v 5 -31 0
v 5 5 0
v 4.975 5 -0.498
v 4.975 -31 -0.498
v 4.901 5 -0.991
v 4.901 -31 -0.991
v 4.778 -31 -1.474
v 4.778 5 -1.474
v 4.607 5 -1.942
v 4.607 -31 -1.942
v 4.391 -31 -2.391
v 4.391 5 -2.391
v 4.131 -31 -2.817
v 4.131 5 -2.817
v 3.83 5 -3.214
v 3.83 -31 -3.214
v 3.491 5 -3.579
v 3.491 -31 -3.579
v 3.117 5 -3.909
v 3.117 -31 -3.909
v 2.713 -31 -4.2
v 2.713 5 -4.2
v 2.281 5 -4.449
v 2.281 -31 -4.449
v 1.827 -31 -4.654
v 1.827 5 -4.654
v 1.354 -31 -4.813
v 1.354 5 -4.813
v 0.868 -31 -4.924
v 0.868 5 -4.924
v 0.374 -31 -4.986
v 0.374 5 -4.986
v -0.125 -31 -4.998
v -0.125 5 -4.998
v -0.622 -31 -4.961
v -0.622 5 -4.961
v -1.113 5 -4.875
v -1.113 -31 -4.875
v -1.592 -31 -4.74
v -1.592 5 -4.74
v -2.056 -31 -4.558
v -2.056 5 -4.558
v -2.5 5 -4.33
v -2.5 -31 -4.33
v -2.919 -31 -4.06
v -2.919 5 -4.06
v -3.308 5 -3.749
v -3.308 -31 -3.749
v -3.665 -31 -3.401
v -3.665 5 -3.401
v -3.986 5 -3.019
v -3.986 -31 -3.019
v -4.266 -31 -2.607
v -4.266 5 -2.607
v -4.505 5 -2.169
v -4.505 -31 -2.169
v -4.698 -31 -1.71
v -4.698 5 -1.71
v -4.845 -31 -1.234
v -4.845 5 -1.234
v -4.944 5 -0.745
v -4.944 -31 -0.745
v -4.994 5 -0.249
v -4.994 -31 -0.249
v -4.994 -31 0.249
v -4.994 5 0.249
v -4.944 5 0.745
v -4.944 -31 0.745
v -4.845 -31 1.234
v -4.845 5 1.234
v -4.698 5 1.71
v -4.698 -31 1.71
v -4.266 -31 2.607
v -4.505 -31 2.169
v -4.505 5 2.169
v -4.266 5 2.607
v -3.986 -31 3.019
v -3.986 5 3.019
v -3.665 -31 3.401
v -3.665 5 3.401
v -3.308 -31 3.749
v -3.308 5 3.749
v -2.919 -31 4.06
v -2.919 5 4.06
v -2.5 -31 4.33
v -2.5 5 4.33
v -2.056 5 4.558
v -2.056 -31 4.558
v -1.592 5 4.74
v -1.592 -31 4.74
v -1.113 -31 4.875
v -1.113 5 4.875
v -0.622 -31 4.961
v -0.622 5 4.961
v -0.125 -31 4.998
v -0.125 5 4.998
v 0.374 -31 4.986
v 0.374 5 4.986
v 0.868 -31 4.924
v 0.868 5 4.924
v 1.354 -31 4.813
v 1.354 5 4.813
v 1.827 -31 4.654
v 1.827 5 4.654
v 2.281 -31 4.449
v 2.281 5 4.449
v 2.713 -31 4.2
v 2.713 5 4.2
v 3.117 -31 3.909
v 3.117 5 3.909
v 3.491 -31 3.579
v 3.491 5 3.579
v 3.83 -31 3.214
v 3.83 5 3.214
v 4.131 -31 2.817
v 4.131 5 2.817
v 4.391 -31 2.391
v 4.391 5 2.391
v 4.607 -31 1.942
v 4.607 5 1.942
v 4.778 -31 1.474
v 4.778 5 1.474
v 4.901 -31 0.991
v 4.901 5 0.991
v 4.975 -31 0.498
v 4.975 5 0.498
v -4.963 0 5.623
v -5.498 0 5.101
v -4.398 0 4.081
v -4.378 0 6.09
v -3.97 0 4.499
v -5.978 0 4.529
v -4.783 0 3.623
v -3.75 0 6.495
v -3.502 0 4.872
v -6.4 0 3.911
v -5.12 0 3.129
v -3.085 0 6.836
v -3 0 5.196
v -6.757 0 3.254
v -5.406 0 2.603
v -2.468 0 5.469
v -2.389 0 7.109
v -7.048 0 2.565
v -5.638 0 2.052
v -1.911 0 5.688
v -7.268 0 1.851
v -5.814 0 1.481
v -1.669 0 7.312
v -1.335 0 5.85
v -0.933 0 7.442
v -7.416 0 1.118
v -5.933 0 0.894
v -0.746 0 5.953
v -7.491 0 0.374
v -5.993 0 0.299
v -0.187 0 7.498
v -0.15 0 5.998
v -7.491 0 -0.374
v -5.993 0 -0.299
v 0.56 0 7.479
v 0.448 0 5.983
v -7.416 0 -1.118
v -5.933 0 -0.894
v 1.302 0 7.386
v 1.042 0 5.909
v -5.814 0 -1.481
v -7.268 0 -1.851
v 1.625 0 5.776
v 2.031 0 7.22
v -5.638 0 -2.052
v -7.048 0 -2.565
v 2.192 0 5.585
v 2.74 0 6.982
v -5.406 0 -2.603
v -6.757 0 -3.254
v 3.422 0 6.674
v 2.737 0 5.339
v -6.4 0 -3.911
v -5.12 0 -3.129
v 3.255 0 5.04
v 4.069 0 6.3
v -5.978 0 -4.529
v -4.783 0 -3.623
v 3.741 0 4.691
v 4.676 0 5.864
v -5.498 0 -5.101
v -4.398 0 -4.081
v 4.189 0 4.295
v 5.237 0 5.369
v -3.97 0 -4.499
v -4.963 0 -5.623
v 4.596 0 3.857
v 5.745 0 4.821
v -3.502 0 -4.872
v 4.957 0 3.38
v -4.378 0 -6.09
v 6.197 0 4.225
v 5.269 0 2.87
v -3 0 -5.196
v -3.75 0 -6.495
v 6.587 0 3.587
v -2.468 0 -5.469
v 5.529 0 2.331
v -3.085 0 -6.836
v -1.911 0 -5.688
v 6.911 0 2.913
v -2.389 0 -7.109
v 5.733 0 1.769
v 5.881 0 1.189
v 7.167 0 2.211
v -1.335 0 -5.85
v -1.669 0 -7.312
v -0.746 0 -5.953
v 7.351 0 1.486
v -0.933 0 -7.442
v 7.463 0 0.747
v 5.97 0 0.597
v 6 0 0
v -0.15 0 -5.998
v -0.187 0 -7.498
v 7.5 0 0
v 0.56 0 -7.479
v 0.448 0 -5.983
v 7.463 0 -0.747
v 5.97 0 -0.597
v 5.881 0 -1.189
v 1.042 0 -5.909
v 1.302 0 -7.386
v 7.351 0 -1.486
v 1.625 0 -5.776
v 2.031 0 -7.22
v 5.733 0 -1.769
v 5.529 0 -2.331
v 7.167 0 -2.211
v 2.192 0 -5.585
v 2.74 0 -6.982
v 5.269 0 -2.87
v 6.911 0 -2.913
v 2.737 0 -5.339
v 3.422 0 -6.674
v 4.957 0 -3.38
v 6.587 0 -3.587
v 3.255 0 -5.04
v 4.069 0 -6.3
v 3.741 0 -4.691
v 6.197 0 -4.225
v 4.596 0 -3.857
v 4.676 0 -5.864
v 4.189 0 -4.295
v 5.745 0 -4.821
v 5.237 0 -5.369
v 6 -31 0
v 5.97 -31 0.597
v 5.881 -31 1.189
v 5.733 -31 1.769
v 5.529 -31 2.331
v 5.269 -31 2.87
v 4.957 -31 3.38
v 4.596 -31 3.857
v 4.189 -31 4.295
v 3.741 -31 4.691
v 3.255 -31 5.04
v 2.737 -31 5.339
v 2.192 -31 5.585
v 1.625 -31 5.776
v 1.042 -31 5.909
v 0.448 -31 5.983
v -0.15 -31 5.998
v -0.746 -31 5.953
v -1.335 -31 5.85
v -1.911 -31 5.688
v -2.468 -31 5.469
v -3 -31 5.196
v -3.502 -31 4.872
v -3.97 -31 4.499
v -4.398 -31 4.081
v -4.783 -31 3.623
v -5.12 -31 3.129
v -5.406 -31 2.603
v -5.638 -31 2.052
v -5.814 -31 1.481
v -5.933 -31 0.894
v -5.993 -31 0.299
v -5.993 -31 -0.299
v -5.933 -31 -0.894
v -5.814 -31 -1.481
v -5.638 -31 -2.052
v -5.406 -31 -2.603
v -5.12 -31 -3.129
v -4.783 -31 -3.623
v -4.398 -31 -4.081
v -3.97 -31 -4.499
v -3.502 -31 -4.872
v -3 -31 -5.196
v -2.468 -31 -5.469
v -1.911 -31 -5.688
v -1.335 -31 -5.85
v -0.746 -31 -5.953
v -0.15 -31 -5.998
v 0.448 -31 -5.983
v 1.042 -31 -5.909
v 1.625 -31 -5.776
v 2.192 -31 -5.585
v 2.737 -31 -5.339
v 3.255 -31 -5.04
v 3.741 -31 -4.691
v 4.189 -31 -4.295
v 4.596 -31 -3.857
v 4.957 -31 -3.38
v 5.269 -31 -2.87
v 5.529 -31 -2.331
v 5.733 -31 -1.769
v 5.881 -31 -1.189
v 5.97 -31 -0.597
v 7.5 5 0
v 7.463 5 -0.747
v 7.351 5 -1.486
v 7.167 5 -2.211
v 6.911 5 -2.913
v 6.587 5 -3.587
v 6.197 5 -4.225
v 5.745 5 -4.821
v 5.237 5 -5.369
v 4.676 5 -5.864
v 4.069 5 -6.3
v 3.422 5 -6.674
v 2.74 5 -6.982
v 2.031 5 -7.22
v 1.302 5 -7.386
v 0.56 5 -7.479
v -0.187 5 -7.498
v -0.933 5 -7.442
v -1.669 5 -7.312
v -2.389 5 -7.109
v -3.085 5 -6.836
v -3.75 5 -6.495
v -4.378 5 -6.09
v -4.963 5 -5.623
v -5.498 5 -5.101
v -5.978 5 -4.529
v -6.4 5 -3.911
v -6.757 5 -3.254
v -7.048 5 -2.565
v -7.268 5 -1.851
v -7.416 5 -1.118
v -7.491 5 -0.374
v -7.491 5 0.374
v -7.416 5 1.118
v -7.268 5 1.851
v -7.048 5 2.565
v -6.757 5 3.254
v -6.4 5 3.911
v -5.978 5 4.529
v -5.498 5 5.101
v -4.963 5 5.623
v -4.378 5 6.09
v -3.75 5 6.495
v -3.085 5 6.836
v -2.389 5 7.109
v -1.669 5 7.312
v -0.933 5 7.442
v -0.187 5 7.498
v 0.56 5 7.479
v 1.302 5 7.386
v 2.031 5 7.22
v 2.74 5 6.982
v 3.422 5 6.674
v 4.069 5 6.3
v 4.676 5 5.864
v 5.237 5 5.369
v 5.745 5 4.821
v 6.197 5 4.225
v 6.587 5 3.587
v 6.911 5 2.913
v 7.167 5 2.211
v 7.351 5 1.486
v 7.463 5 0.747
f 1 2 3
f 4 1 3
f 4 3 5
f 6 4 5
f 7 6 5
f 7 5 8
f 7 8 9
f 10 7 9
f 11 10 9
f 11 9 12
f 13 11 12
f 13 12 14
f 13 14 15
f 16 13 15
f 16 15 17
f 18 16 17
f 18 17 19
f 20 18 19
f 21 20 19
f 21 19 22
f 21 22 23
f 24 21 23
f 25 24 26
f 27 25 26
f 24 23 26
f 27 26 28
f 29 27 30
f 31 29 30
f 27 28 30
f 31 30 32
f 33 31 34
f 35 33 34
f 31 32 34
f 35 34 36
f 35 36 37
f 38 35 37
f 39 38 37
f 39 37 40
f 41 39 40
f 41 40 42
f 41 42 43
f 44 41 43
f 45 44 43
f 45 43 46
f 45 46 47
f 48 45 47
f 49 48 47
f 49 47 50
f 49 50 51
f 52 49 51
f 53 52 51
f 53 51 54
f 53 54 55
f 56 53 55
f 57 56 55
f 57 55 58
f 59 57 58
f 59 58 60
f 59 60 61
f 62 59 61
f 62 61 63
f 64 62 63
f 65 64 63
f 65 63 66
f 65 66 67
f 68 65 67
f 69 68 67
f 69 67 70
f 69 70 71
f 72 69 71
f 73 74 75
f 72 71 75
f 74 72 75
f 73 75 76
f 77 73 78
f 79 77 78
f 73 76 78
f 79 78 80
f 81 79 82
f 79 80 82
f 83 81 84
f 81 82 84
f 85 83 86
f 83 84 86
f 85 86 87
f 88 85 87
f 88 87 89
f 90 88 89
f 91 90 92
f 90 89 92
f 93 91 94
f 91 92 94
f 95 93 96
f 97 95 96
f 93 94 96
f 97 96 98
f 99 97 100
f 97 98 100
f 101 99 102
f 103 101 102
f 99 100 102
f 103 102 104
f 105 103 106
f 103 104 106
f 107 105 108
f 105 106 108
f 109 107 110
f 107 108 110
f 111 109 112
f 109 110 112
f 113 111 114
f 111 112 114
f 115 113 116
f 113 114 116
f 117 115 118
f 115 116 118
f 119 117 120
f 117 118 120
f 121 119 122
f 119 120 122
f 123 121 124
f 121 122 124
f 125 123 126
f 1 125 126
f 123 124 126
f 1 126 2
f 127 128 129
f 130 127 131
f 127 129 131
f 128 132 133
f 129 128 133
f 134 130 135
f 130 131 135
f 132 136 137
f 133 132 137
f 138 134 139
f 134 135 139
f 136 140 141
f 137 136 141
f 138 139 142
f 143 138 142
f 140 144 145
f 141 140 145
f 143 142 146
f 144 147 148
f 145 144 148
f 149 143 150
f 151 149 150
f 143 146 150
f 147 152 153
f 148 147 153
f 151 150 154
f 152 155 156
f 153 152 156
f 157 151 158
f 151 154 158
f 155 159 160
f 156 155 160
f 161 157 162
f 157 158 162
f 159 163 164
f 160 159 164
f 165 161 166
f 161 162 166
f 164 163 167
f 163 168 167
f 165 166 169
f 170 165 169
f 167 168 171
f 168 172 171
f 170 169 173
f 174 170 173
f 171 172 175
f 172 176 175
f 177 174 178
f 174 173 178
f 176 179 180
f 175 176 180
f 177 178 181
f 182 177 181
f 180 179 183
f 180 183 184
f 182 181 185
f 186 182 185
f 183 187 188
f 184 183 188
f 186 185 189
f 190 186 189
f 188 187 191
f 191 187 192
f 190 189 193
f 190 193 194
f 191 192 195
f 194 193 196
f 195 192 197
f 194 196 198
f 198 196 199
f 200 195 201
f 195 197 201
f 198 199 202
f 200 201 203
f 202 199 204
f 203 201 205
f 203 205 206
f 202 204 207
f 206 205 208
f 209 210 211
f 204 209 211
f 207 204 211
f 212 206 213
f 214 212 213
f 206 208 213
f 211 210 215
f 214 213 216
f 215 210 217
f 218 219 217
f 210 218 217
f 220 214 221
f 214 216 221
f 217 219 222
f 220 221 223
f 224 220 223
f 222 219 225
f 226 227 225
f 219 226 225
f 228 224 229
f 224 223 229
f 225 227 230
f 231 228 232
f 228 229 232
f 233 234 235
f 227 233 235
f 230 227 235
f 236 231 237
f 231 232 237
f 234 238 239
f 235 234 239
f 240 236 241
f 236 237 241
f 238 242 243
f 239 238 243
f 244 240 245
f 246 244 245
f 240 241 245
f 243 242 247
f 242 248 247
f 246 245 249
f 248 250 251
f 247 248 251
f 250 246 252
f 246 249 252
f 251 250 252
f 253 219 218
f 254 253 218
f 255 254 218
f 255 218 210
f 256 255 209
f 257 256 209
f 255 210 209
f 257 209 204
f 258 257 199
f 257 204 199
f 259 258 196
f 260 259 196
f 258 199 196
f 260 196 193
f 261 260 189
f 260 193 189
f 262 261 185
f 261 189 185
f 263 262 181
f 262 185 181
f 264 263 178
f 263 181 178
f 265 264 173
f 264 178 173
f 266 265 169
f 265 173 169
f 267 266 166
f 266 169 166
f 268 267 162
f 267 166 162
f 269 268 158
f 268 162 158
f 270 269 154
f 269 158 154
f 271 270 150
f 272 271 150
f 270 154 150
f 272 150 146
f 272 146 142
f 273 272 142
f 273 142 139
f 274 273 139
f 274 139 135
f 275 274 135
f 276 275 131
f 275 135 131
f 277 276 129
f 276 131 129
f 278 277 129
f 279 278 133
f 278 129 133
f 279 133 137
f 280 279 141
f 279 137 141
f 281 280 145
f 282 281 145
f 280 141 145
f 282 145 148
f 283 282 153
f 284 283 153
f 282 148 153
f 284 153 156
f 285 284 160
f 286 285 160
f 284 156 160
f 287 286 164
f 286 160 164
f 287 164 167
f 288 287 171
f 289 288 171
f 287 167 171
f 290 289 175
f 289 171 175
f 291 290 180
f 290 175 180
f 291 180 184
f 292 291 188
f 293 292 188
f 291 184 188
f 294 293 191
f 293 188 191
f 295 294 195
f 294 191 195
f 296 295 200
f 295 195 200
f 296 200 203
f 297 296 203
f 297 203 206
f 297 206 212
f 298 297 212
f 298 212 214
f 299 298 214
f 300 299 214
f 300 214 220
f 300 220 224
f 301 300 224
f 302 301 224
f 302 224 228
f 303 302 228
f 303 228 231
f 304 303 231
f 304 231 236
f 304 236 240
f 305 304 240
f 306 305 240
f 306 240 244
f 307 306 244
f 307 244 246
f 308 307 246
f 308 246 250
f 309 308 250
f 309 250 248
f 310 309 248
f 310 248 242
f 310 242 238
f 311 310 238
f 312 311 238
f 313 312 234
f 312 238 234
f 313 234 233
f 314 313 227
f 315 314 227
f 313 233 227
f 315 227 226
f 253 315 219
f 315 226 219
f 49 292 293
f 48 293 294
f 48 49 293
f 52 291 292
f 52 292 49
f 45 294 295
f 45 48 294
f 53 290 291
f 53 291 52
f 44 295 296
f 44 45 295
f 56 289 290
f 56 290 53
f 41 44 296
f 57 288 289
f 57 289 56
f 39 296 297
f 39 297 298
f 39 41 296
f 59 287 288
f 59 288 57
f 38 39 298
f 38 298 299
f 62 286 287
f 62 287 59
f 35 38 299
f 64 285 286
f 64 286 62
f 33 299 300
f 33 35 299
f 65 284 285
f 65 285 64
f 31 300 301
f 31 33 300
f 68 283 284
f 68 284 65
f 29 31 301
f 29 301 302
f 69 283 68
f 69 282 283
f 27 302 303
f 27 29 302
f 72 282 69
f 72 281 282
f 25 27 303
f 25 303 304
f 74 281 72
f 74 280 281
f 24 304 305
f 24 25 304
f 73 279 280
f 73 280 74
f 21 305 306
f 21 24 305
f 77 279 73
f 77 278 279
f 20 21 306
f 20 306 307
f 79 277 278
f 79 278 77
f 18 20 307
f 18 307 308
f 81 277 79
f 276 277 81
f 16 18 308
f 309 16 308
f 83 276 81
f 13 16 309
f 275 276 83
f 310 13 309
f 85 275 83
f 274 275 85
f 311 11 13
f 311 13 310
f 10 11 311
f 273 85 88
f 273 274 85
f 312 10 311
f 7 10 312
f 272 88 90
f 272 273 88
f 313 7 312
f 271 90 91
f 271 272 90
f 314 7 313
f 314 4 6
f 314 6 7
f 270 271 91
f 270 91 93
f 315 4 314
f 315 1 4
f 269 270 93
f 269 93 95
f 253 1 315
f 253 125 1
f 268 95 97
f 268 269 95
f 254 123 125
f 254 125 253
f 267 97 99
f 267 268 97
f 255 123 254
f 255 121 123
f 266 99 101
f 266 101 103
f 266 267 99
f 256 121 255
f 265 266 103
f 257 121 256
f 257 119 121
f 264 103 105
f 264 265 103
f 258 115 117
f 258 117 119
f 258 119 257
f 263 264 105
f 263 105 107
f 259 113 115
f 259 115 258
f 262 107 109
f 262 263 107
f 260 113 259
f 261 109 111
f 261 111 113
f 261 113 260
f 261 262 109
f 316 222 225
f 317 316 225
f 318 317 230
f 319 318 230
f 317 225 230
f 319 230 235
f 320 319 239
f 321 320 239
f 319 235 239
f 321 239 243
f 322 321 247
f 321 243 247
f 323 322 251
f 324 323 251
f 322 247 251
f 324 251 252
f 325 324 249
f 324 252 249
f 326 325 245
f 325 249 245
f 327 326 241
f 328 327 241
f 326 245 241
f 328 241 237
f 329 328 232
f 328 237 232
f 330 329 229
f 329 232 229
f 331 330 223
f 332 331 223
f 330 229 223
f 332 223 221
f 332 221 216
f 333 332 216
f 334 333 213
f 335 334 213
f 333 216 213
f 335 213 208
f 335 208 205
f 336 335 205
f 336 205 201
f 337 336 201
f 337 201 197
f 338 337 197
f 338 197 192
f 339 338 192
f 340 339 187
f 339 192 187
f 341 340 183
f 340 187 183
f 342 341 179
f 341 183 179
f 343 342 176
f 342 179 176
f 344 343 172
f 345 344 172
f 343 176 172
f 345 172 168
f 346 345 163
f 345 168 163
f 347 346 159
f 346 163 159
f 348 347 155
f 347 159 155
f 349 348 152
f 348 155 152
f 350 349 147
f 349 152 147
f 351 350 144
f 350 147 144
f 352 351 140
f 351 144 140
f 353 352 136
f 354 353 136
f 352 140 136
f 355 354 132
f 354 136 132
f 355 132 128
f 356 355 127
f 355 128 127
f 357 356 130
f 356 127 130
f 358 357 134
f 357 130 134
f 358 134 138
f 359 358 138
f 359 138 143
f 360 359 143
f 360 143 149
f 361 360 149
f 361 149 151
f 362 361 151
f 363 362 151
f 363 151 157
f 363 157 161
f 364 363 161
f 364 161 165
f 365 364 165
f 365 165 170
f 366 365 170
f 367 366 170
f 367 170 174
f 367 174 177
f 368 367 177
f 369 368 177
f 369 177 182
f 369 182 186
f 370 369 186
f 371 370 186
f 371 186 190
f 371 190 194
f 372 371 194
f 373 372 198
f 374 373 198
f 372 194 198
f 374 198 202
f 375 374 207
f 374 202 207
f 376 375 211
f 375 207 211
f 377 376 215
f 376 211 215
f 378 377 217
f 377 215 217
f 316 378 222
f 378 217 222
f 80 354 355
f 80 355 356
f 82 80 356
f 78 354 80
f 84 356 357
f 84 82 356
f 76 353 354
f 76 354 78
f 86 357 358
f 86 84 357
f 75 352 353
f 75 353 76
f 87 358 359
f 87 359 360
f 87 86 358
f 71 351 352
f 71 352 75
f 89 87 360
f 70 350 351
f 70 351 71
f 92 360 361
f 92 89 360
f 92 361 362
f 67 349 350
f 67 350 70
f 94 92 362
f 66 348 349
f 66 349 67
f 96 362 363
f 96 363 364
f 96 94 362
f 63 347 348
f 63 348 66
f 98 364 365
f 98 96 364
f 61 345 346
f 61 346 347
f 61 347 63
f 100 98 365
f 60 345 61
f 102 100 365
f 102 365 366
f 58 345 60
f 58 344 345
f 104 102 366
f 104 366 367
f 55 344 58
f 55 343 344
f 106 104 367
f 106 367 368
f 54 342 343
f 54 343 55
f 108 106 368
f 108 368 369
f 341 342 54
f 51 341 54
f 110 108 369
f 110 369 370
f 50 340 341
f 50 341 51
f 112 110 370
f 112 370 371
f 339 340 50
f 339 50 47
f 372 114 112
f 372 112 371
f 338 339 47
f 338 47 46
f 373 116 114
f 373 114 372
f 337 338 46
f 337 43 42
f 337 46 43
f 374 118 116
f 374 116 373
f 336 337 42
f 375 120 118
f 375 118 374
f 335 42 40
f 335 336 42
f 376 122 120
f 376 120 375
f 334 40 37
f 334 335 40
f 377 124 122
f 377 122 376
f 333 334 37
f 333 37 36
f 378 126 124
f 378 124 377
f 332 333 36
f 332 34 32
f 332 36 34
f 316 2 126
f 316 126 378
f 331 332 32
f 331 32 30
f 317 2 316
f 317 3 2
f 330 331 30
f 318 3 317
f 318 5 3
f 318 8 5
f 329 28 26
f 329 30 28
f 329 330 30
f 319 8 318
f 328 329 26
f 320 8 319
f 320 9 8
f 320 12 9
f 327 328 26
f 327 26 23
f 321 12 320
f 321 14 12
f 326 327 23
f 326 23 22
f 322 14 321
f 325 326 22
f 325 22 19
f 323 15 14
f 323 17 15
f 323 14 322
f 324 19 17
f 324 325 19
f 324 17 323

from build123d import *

# Parameters (mm, degrees)
ESQUISSE1_R      = 7.5
EXTRUSION1_DEPTH = 5
ESQUISSE2_R      = 6
EXTRUSION2_DEPTH = 31
EXTRUSION3_REACH = 38
ESQUISSE3_R      = 5


with BuildPart() as part:
    # Esquisse1 → Extrusion1 (new body)
    with BuildSketch(Plane(origin=(0, 0, 0), x_dir=(1, 0, 0), z_dir=(0, 1, 0))):
        Circle(ESQUISSE1_R)
    extrude(amount=EXTRUSION1_DEPTH)

    # Esquisse2 → Extrusion2 (add)
    with BuildSketch(Plane.XZ):
        Circle(ESQUISSE2_R)
    extrude(amount=EXTRUSION2_DEPTH)

    # Esquisse3 → Extrusion3 (cut, up to next)
    with BuildSketch(Plane(origin=(0, 5, 0), x_dir=(1, 0, 0), z_dir=(0, 1, 0)), mode=Mode.PRIVATE) as extrusion3_sk1:
        Circle(ESQUISSE3_R)
    extrusion3_tool1 = extrude(extrusion3_sk1.sketch, amount=-EXTRUSION3_REACH, mode=Mode.PRIVATE) & part.part
    add(extrusion3_tool1.solids().sort_by_distance((0, 5, 0))[0], mode=Mode.SUBTRACT)


solid = part.part
